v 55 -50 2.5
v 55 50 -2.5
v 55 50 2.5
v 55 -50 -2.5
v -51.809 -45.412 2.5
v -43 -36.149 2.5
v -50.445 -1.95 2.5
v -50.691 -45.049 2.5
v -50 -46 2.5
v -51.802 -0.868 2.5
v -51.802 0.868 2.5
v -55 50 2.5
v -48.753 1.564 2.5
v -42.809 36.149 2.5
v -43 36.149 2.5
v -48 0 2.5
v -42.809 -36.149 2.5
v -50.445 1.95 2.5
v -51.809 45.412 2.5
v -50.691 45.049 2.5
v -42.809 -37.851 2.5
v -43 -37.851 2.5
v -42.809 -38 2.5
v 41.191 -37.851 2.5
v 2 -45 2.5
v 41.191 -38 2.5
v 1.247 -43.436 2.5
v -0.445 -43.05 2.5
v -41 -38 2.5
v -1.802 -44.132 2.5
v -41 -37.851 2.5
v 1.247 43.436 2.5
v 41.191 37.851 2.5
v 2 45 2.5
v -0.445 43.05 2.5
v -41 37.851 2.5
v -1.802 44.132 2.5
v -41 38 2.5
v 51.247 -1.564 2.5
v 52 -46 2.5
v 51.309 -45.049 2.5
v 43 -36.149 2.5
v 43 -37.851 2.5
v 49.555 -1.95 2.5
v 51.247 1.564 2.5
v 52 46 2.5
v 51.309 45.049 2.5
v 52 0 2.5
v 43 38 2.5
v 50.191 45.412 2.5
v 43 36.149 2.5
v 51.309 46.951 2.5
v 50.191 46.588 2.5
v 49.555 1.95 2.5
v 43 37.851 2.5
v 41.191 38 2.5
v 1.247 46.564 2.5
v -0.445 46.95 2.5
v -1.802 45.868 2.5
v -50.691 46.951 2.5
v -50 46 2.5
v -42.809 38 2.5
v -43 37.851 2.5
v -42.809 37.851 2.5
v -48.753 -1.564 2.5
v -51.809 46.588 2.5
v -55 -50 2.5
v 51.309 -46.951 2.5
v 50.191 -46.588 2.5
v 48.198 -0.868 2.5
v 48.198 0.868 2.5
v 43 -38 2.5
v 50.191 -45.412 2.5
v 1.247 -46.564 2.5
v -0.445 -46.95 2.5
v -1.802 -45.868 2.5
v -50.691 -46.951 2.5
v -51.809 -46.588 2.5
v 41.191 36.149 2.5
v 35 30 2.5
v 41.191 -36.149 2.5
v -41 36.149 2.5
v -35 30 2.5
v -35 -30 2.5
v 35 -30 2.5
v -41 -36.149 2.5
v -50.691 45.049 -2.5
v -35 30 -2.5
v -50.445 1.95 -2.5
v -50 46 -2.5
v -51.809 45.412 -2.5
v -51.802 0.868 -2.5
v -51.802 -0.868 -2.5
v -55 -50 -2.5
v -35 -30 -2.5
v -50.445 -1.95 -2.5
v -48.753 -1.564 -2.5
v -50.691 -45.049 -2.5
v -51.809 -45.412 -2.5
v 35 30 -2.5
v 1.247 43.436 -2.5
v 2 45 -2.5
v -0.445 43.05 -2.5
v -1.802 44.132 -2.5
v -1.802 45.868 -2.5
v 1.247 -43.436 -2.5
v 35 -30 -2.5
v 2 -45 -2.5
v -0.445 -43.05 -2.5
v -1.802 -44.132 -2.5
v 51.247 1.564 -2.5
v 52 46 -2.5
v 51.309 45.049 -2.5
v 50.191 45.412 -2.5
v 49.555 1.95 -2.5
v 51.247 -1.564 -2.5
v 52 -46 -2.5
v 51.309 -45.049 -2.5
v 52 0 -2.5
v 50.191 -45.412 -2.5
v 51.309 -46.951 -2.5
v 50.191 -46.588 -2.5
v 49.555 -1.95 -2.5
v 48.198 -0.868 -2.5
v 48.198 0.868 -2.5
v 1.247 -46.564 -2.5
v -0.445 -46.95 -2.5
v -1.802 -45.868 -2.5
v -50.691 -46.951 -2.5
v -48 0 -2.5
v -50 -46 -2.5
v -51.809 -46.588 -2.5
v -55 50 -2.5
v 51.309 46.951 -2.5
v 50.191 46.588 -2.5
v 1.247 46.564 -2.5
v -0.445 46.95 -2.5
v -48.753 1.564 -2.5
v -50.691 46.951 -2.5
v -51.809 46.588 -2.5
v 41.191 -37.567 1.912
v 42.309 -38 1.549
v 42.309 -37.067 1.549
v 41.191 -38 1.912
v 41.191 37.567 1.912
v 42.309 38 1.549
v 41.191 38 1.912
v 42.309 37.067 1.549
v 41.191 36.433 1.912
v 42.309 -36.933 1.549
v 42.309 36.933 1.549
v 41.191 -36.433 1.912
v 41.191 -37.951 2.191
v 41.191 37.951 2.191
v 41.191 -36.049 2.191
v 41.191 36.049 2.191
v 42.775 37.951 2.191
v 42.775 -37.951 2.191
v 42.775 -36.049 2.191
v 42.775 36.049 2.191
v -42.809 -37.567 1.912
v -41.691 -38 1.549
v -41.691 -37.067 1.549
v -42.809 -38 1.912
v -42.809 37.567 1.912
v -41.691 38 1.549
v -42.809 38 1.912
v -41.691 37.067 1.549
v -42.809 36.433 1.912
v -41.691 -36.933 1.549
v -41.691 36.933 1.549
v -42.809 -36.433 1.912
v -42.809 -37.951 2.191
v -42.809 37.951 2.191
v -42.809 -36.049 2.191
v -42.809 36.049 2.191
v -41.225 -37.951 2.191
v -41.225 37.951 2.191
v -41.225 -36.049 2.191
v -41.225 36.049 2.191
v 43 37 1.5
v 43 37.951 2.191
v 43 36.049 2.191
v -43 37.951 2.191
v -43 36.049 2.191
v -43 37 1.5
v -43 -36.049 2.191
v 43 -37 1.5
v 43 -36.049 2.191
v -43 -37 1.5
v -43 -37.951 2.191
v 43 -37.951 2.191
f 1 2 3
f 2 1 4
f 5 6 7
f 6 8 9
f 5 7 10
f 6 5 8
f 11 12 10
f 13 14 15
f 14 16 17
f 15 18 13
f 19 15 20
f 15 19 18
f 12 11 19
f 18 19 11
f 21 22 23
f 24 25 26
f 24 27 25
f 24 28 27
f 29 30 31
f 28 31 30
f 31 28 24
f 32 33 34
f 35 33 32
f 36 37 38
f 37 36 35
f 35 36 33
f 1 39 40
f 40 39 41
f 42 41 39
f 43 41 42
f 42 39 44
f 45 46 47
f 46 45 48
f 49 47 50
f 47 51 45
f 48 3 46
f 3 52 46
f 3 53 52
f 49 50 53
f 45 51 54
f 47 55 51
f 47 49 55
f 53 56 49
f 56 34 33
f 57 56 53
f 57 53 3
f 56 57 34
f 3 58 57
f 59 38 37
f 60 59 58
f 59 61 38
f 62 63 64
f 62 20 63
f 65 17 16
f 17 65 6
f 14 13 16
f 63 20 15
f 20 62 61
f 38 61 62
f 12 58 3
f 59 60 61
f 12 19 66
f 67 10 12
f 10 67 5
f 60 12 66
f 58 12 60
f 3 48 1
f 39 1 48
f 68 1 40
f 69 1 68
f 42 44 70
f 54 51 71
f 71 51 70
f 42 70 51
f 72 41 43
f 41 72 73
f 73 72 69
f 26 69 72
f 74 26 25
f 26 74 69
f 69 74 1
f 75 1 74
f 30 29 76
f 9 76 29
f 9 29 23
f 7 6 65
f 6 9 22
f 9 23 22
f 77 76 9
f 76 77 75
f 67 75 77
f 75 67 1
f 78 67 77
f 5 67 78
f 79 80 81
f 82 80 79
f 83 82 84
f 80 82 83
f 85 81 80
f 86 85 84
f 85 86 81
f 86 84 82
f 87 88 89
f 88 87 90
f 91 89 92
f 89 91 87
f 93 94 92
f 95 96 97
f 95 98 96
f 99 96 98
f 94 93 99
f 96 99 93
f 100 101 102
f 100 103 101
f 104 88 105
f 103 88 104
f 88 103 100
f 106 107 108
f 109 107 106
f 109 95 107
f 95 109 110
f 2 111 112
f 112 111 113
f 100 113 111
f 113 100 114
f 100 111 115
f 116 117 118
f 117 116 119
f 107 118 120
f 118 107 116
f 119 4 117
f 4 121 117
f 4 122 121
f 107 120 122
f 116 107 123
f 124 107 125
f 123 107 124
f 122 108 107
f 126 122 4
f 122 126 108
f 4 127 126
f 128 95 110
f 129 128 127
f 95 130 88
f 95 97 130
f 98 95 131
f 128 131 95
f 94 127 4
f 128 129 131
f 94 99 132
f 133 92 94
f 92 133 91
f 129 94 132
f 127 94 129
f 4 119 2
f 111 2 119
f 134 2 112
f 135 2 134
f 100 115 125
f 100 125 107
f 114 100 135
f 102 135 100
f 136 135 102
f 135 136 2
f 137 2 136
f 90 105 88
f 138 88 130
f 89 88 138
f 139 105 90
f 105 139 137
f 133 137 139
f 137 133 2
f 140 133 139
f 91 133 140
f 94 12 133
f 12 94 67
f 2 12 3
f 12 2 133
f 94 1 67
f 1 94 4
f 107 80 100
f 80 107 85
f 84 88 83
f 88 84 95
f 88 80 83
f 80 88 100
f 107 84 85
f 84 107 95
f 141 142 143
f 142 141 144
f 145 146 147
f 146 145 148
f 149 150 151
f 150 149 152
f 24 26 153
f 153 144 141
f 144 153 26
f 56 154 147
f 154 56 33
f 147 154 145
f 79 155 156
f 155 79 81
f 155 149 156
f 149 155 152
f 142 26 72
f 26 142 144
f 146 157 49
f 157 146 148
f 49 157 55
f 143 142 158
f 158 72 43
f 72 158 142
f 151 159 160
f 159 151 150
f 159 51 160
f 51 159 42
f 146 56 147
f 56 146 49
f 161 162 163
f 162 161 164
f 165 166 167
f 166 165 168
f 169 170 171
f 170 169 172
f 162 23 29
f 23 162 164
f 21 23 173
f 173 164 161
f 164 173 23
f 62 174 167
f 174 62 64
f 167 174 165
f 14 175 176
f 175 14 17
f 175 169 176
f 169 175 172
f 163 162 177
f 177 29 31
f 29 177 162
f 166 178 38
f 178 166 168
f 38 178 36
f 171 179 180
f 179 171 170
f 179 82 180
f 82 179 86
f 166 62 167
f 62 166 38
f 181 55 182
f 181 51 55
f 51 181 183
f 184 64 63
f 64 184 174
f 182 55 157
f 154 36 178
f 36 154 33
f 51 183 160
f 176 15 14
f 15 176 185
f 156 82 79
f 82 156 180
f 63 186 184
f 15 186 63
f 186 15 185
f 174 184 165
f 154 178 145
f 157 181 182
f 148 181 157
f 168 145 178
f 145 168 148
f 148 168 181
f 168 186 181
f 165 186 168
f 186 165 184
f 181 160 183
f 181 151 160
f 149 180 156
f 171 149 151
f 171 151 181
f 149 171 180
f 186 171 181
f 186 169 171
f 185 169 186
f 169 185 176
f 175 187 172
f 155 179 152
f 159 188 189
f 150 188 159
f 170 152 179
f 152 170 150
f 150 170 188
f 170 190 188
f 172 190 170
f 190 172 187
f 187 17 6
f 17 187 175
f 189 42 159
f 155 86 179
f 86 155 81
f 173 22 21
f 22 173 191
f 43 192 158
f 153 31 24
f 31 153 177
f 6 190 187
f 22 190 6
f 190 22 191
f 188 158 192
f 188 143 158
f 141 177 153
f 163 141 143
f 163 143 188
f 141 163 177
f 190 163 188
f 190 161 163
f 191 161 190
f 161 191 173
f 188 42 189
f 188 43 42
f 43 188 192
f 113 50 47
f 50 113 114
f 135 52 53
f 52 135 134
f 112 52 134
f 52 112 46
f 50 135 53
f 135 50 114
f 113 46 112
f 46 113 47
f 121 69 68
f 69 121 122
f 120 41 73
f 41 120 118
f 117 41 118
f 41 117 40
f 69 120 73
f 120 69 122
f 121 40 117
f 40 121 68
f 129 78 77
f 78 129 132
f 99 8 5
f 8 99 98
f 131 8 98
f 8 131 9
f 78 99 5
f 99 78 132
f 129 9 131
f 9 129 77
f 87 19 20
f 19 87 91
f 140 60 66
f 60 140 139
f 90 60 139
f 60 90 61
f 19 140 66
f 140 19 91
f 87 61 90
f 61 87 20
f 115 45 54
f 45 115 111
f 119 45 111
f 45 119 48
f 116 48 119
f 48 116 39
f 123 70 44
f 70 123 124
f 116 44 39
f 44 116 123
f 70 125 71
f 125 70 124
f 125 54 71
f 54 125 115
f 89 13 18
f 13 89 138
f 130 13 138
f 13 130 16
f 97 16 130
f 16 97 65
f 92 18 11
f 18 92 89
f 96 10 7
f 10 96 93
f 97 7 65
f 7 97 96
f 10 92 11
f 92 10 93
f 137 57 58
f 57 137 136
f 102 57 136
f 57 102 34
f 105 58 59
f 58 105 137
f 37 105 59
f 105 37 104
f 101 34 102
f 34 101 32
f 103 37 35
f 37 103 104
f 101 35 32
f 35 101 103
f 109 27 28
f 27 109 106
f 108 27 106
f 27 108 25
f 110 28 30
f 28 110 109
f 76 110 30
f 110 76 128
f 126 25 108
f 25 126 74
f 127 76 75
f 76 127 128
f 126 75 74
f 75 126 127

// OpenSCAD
// file: metal_lid.scad
//Metal //Lid

module metal_lid(x,y,s_d, or_rad)
{
   difference(){
    difference(){
     difference(){
      difference(){ 
       difference(){
        difference(){
         difference(){
          difference(){ 
           difference(){
            difference(){
             difference(){
              difference(){
               difference(){
                difference(){
        cube([x,y,5], center = true);
        
        cube ([x-40,y-40,6], center = true);
        }
        
        //o ring holder
    
    translate([x/2-13,0,2.5]) 
    rotate([90,0,0])  
    cylinder(r=or_rad,h=(y-24), center=true);
}                  
    translate([-(x/2-13),0,2.5])
    rotate([90,0,0])
    cylinder(r=or_rad,h=(y-24), center=true);
}   
    translate([0,y/2-13,2.5])  
    rotate([0,90,0])
    cylinder(r=or_rad,h=(y-14), center=true);
}

    translate([0,-(y/2-13),2.5])   
    rotate([0,90,0])
    cylinder(r=or_rad,h=(y-14), center=true);

 }
    
 
  //screws holes for quartz
 //1
 translate([x/2-5,0,0])
 cylinder(r=s_d/2,h=6, center=true);
 }
//2
  translate([-(x/2-5),0,0])
 cylinder(r=s_d/2,h=6, center=true);
}
//3
translate([0,(y/2-5),0])
 cylinder(r=s_d/2,h=6, center=true);
}
//4
translate([0,-(y/2-5),0])
 cylinder(r=s_d/2,h=6, center=true);

}
    

}
//guide holes for screwing
//1
translate([x/2-4,y/2-4,0])
cylinder(r=1,h=6, center = true);
}
//2
translate([x/2-4,-(y/2-4),0])
cylinder(r=1,h=6, center = true);
}
//3
translate([-(x/2-4),-(y/2-4),0])
cylinder(r=1,h=6, center = true);
}
//4
translate([-(x/2-4),(y/2-4),0])
cylinder(r=1,h=6, center = true);
}

}

metal_lid(110,100,4.2,1);
// file: quartz_window.scad
//Quartz Window model
module window(x, y, t){
    //difference(){
       // difference(){
            //difference(){
                //difference(){
                        cube([x-16,y-16,t],center=true);
                    
//screws holes for quartz
 //1
 //translate([x/2-,0,0])
 //cylinder(r=s_d/2,h=t+1, center=true);
 //}
//2
  //translate([-(x/2-5),0,0])
 //cylinder(r=s_d/2,h=t+1, center=true);
//}
//3
//translate([0,(y/2-5),0])
 //cylinder(r=s_d/2,h=t+1, center=true);
//
//4
//translate([0,-(y/2-5),0])
 //cylinder(r=s_d/2,h=t+1, center=true);

//}
//}
}
//window(110,100,3);
// main file
//lid profile

//quartz plate
    include<quartz_window.scad>
    translate([0,0,4])
    %window(110,100,3);
    
    //metal lide
    include<metal_lid.scad>
    translate([0,0,0])
    rotate([0,0,0])
    metal_lid(110,100,4,1.3);
